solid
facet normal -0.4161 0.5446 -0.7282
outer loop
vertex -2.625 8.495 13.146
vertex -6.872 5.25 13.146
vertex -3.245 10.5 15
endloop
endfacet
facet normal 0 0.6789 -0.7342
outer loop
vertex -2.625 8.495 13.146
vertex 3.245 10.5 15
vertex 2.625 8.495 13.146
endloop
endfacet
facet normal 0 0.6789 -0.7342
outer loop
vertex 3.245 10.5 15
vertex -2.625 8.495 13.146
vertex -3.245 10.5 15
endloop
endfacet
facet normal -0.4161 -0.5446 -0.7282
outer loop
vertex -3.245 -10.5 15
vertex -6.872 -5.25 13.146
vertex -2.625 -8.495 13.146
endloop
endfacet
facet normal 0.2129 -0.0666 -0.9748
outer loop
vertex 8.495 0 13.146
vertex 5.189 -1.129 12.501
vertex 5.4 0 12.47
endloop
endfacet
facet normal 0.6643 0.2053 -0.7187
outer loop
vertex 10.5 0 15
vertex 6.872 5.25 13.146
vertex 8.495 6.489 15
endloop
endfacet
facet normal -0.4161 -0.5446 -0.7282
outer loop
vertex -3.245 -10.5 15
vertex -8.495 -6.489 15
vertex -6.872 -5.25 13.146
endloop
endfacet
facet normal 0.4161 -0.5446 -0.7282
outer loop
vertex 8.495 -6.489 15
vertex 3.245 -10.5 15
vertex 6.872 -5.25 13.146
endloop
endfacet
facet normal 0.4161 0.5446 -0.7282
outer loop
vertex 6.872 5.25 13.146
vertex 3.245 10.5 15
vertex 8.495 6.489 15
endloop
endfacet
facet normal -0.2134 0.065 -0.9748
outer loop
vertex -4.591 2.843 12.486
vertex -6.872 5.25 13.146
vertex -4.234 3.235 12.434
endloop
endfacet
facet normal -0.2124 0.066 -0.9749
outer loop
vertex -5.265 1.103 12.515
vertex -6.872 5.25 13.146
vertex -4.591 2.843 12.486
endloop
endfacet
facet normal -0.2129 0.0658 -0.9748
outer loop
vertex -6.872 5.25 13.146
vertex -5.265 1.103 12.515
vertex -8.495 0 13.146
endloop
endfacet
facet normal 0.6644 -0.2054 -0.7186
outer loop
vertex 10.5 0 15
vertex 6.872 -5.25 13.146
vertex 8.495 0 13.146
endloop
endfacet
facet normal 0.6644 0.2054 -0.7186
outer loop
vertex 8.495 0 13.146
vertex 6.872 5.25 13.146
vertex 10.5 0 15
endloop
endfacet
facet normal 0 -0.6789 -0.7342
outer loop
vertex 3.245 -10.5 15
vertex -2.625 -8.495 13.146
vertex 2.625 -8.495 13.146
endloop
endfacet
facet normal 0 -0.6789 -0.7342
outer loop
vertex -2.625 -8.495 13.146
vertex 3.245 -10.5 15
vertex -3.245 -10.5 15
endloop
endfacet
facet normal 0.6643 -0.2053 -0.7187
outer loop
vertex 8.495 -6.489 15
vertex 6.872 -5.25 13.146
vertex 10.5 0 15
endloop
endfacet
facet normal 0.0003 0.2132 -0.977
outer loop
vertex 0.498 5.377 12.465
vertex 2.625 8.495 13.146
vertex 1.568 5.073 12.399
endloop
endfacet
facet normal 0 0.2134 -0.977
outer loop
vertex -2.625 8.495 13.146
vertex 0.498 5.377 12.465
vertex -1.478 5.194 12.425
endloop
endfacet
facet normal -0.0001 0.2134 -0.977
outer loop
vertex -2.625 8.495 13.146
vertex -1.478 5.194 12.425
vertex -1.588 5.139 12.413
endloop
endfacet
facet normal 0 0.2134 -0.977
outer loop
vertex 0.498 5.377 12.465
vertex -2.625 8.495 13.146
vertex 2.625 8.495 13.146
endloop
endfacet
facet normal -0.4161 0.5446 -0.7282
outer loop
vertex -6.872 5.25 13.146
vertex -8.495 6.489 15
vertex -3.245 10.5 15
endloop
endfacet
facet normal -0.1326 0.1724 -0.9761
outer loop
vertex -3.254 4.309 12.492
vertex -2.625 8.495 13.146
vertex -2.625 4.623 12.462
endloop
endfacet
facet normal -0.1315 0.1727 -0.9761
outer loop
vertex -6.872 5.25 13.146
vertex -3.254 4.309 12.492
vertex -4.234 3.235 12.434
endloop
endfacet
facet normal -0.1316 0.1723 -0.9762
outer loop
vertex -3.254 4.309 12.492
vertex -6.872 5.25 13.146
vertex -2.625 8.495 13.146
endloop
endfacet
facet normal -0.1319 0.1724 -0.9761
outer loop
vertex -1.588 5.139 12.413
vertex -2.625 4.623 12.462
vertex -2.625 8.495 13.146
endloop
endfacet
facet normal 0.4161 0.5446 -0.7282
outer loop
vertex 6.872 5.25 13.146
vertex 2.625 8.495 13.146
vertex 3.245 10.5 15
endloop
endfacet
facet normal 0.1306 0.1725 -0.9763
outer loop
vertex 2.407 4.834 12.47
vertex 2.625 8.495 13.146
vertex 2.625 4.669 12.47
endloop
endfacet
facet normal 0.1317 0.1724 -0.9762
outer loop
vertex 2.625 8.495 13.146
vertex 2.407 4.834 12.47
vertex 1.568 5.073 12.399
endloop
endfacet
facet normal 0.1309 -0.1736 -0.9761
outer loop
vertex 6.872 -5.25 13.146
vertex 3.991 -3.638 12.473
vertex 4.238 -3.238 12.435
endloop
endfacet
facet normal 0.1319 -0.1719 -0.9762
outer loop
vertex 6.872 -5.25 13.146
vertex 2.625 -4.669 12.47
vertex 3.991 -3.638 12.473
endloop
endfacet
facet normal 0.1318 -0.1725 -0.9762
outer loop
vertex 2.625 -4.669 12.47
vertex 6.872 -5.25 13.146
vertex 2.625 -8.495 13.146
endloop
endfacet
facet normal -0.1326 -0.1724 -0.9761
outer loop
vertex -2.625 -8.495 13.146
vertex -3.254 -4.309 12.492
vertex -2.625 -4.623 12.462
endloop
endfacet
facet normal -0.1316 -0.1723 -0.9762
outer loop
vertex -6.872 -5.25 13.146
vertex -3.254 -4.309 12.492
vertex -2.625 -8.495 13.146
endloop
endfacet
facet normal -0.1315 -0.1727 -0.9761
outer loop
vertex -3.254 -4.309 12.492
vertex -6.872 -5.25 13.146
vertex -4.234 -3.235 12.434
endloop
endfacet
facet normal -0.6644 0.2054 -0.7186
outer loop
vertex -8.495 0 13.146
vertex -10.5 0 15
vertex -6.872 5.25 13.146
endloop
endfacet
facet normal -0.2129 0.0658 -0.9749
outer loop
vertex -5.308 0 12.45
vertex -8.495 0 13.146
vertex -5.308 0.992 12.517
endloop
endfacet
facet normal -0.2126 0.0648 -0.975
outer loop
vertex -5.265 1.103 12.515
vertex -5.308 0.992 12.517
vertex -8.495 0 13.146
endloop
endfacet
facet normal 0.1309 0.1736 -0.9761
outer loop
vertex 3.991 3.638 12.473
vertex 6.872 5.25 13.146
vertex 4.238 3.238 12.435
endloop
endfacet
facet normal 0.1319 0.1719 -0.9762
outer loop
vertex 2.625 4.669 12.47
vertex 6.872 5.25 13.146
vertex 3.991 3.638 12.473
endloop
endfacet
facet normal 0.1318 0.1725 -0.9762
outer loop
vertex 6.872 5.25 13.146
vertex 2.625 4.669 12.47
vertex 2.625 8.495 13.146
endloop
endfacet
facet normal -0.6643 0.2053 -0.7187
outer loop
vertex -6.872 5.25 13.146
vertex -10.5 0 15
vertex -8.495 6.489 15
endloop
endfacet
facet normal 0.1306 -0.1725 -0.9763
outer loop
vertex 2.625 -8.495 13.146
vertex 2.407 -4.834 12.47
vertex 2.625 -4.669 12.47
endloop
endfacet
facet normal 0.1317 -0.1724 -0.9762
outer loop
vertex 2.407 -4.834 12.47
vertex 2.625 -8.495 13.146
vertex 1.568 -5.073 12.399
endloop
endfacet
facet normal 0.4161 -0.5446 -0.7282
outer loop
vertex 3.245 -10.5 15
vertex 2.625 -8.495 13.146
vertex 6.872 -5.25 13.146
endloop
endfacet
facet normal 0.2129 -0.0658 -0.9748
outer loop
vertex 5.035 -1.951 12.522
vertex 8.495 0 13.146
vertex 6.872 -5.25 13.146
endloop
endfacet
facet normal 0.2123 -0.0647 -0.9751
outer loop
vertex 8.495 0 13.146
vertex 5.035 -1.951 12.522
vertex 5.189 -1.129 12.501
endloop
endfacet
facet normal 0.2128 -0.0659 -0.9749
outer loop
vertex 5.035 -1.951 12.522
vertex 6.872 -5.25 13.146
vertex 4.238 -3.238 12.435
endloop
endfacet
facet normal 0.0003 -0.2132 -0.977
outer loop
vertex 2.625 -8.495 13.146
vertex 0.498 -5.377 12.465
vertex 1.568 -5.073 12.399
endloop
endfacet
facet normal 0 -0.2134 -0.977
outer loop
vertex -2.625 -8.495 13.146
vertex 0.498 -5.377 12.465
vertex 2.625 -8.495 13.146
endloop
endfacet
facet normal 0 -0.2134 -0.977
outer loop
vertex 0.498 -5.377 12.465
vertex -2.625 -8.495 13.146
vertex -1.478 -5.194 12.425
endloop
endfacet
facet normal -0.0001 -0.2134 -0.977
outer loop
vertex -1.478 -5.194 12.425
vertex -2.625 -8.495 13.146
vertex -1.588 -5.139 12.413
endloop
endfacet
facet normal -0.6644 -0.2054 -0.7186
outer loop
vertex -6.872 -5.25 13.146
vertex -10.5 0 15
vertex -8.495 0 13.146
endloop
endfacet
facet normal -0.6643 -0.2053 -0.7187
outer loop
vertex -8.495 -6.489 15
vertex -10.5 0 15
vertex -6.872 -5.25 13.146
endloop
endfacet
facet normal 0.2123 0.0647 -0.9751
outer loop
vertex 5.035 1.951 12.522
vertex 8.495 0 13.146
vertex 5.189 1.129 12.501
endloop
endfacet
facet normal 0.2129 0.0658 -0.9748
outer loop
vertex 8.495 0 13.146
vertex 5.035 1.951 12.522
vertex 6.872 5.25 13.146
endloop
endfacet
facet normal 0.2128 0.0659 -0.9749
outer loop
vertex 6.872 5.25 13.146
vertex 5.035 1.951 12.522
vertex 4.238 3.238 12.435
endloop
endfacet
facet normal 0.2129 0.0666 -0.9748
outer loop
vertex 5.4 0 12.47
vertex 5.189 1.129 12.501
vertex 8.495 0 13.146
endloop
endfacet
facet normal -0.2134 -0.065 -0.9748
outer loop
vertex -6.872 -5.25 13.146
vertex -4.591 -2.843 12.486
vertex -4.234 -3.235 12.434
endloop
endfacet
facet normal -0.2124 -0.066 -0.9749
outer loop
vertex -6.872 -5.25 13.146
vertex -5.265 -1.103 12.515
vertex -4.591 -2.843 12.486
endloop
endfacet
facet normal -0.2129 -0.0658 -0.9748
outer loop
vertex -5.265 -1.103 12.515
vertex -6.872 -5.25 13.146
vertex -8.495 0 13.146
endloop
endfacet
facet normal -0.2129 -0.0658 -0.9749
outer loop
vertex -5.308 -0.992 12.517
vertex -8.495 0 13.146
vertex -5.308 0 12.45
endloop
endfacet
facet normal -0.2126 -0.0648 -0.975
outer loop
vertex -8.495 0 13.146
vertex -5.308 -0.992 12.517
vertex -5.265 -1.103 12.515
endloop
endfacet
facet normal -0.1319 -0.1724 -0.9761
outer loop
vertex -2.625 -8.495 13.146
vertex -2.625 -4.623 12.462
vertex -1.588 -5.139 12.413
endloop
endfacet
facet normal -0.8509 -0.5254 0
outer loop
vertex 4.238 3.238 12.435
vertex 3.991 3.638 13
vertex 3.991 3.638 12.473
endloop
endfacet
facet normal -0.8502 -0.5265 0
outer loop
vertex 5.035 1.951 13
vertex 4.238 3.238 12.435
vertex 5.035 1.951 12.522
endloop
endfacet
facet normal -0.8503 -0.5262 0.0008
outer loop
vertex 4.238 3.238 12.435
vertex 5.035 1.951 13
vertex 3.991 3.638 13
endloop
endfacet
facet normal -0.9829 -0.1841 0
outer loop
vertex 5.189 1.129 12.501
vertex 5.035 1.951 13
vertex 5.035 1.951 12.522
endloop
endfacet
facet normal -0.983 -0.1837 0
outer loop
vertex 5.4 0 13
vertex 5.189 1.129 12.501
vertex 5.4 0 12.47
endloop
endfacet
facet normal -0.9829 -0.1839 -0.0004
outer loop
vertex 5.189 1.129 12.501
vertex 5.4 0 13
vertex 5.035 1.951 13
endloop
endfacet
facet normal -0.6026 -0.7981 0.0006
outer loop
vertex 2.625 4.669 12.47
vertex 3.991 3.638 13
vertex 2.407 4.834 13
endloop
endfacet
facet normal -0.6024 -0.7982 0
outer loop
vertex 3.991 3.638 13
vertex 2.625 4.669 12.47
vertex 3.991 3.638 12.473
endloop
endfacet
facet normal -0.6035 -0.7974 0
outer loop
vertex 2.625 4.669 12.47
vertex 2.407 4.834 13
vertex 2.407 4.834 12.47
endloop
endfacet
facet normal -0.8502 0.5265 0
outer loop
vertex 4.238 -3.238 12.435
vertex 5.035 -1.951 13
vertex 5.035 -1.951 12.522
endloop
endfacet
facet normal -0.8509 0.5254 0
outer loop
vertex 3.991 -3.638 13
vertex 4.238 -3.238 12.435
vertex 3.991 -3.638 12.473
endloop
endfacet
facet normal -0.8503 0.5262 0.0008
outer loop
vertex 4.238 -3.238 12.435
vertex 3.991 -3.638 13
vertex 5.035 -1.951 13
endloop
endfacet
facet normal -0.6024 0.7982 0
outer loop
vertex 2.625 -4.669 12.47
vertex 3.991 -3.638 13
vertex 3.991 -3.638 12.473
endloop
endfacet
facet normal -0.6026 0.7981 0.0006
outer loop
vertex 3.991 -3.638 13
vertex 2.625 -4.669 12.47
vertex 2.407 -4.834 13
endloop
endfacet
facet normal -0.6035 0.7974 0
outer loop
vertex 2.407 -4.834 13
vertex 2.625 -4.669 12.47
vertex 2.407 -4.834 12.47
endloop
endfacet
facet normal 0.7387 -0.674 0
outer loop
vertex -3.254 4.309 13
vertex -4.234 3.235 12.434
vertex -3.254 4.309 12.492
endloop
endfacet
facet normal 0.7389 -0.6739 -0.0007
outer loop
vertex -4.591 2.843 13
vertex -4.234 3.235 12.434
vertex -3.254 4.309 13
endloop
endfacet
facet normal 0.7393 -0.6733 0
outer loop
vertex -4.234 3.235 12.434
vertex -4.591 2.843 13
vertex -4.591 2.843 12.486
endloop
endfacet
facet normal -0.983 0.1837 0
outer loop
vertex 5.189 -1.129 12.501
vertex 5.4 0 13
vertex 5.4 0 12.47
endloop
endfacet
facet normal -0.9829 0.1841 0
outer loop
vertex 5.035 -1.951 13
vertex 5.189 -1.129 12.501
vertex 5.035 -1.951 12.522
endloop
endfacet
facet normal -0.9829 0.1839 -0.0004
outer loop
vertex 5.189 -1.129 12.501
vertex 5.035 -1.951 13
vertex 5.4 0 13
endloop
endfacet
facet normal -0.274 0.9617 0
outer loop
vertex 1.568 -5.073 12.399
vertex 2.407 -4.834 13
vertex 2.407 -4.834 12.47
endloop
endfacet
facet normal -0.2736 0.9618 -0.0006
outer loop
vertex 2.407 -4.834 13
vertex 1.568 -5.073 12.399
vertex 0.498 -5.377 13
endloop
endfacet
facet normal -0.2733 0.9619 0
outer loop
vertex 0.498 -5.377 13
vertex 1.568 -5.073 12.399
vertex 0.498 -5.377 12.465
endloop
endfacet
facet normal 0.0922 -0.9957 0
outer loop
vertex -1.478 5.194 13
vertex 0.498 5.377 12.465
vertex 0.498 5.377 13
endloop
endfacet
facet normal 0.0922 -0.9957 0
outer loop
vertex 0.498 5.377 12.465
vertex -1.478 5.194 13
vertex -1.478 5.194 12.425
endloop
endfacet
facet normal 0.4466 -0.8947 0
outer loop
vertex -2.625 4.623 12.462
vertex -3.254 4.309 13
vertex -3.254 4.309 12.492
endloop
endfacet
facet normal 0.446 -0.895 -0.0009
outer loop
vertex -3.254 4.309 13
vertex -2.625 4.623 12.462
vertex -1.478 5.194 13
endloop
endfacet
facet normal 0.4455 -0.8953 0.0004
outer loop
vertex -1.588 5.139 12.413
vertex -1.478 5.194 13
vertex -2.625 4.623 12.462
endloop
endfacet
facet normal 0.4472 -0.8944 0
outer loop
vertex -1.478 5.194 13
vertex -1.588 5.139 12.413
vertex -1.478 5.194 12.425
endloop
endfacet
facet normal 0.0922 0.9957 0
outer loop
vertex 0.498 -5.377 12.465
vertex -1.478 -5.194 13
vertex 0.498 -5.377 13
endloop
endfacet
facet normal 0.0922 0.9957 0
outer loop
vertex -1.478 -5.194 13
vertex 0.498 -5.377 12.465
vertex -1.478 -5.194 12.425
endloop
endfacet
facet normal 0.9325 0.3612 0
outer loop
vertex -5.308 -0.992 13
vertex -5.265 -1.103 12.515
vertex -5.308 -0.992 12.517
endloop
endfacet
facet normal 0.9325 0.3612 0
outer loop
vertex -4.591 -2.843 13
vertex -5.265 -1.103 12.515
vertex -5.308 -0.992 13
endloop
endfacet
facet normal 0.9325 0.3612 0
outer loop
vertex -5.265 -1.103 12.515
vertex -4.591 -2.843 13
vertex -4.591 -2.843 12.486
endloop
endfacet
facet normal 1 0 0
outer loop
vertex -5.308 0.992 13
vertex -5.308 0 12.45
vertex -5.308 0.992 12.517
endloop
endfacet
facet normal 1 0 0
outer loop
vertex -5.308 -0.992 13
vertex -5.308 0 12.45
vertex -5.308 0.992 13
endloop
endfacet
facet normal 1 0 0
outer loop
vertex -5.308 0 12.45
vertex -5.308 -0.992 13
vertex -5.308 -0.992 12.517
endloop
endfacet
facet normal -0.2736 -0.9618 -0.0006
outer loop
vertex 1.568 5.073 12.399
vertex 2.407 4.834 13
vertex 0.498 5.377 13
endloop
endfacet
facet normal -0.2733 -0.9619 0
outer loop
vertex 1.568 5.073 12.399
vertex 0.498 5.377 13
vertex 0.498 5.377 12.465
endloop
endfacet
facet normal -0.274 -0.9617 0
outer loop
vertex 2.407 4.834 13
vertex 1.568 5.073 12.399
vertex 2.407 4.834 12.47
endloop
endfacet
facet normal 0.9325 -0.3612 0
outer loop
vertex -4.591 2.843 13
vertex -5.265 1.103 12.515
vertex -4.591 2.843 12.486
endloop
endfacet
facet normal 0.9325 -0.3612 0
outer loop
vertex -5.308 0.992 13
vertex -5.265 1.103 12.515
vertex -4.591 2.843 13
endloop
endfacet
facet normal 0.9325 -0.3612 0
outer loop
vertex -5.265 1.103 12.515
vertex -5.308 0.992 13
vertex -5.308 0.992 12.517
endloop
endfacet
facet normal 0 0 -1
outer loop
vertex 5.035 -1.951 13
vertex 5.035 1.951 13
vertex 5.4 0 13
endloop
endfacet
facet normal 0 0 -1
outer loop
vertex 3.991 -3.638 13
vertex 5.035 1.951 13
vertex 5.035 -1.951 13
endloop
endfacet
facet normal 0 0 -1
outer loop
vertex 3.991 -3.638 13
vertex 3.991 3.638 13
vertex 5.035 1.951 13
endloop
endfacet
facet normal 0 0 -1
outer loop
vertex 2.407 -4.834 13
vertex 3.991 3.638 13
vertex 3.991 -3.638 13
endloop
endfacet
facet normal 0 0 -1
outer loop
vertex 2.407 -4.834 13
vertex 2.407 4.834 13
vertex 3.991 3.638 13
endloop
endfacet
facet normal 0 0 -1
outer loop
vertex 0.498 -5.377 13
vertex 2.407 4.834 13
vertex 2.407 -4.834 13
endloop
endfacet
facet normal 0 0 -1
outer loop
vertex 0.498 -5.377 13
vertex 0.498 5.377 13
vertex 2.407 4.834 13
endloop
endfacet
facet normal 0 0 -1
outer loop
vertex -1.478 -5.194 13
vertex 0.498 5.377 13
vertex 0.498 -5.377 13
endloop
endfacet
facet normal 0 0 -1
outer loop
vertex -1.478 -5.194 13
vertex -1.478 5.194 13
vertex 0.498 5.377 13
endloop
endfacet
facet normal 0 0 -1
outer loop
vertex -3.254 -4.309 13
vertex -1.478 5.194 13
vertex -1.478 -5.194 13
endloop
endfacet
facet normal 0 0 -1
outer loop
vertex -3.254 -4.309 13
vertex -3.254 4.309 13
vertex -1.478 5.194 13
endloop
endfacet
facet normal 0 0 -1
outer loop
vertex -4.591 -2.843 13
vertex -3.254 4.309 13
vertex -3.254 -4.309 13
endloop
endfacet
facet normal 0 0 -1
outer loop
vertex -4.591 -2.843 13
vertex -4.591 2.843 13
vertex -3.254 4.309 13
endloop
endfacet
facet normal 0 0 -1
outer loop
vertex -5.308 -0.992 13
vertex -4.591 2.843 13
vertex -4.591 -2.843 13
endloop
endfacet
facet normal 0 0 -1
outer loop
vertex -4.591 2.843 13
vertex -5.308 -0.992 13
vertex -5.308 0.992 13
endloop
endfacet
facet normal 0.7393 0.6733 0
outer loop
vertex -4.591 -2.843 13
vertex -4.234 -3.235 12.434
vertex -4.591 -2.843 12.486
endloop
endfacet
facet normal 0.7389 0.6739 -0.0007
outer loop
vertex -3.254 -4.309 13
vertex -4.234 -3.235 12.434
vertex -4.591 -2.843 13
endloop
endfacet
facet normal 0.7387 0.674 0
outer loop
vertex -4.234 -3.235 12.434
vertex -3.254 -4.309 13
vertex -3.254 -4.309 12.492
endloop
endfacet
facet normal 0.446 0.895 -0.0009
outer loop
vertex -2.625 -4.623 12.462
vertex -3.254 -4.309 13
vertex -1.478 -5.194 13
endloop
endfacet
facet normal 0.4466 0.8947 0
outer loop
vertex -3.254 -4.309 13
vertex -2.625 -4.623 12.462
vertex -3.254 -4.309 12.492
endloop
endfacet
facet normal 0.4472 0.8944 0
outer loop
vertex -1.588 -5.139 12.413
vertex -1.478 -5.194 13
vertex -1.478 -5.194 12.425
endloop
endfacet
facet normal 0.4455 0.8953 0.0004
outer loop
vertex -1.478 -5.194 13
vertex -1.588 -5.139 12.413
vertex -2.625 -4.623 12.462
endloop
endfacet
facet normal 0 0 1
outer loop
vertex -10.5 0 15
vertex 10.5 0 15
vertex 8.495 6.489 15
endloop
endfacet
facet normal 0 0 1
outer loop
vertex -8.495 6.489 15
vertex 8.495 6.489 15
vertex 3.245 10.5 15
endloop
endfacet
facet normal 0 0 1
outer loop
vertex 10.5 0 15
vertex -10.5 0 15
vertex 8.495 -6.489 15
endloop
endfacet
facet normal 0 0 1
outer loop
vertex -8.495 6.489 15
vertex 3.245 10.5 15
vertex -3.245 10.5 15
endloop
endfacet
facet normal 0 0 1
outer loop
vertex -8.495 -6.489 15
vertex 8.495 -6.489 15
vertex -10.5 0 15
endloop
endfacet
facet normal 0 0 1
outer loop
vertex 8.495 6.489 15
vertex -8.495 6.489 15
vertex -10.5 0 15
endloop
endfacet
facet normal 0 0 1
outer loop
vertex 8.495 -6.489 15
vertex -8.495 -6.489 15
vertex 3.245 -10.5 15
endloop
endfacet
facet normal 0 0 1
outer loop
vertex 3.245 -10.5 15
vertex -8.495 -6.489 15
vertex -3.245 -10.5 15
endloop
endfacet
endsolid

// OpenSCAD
// file: stick.scad
module stick(stick_height, stick_radius, graft_depth, graft_hole_width, graft_hole_height, graft_hole_depth, graft_wall_size) {
    difference(){
        union(){
            cylinder(h=stick_height, r=stick_radius, $fn=60);
            translate([0, 0, stick_height])
            cylinder(h=graft_depth, r=graft_hole_height/2+graft_wall_size, $fn=60);
        }
        translate([-(graft_hole_width)/2, -(graft_hole_height)/2, stick_height+graft_depth-graft_hole_depth])
        cube([graft_hole_width, graft_hole_height, graft_hole_depth]);
    }
}
// file: pad.scad
module pad(pad_diameter, pad_thickness) {
    resize([pad_diameter, pad_diameter, pad_thickness])
    sphere(d=pad_diameter, $fn=10);
}
// file: measures.scad
pad_diameter = 21;
pad_thickness = 6;
dome_diameter = 27;
dome_height = 8;
graft_hole_width = 3;
graft_hole_height = 4;
stick_height = 6;
stick_radius = 10/2;
graft_depth = 4;
graft_hole_depth = 5;
wall_size = 1;
// main file
include <measures.scad>
include <pad.scad>
include <stick.scad>


difference(){
    translate([0, 0, dome_height+stick_height+pad_thickness/2-2])
    pad(pad_diameter, pad_thickness);
    
    translate([0, 0, dome_height-1])
    cylinder(h=stick_height, r=stick_radius+0.4);
    
    translate([-pad_diameter/2, -pad_diameter/2, dome_height+stick_height+pad_thickness/2-2])
    cube([pad_diameter, pad_diameter, pad_thickness]);
}
